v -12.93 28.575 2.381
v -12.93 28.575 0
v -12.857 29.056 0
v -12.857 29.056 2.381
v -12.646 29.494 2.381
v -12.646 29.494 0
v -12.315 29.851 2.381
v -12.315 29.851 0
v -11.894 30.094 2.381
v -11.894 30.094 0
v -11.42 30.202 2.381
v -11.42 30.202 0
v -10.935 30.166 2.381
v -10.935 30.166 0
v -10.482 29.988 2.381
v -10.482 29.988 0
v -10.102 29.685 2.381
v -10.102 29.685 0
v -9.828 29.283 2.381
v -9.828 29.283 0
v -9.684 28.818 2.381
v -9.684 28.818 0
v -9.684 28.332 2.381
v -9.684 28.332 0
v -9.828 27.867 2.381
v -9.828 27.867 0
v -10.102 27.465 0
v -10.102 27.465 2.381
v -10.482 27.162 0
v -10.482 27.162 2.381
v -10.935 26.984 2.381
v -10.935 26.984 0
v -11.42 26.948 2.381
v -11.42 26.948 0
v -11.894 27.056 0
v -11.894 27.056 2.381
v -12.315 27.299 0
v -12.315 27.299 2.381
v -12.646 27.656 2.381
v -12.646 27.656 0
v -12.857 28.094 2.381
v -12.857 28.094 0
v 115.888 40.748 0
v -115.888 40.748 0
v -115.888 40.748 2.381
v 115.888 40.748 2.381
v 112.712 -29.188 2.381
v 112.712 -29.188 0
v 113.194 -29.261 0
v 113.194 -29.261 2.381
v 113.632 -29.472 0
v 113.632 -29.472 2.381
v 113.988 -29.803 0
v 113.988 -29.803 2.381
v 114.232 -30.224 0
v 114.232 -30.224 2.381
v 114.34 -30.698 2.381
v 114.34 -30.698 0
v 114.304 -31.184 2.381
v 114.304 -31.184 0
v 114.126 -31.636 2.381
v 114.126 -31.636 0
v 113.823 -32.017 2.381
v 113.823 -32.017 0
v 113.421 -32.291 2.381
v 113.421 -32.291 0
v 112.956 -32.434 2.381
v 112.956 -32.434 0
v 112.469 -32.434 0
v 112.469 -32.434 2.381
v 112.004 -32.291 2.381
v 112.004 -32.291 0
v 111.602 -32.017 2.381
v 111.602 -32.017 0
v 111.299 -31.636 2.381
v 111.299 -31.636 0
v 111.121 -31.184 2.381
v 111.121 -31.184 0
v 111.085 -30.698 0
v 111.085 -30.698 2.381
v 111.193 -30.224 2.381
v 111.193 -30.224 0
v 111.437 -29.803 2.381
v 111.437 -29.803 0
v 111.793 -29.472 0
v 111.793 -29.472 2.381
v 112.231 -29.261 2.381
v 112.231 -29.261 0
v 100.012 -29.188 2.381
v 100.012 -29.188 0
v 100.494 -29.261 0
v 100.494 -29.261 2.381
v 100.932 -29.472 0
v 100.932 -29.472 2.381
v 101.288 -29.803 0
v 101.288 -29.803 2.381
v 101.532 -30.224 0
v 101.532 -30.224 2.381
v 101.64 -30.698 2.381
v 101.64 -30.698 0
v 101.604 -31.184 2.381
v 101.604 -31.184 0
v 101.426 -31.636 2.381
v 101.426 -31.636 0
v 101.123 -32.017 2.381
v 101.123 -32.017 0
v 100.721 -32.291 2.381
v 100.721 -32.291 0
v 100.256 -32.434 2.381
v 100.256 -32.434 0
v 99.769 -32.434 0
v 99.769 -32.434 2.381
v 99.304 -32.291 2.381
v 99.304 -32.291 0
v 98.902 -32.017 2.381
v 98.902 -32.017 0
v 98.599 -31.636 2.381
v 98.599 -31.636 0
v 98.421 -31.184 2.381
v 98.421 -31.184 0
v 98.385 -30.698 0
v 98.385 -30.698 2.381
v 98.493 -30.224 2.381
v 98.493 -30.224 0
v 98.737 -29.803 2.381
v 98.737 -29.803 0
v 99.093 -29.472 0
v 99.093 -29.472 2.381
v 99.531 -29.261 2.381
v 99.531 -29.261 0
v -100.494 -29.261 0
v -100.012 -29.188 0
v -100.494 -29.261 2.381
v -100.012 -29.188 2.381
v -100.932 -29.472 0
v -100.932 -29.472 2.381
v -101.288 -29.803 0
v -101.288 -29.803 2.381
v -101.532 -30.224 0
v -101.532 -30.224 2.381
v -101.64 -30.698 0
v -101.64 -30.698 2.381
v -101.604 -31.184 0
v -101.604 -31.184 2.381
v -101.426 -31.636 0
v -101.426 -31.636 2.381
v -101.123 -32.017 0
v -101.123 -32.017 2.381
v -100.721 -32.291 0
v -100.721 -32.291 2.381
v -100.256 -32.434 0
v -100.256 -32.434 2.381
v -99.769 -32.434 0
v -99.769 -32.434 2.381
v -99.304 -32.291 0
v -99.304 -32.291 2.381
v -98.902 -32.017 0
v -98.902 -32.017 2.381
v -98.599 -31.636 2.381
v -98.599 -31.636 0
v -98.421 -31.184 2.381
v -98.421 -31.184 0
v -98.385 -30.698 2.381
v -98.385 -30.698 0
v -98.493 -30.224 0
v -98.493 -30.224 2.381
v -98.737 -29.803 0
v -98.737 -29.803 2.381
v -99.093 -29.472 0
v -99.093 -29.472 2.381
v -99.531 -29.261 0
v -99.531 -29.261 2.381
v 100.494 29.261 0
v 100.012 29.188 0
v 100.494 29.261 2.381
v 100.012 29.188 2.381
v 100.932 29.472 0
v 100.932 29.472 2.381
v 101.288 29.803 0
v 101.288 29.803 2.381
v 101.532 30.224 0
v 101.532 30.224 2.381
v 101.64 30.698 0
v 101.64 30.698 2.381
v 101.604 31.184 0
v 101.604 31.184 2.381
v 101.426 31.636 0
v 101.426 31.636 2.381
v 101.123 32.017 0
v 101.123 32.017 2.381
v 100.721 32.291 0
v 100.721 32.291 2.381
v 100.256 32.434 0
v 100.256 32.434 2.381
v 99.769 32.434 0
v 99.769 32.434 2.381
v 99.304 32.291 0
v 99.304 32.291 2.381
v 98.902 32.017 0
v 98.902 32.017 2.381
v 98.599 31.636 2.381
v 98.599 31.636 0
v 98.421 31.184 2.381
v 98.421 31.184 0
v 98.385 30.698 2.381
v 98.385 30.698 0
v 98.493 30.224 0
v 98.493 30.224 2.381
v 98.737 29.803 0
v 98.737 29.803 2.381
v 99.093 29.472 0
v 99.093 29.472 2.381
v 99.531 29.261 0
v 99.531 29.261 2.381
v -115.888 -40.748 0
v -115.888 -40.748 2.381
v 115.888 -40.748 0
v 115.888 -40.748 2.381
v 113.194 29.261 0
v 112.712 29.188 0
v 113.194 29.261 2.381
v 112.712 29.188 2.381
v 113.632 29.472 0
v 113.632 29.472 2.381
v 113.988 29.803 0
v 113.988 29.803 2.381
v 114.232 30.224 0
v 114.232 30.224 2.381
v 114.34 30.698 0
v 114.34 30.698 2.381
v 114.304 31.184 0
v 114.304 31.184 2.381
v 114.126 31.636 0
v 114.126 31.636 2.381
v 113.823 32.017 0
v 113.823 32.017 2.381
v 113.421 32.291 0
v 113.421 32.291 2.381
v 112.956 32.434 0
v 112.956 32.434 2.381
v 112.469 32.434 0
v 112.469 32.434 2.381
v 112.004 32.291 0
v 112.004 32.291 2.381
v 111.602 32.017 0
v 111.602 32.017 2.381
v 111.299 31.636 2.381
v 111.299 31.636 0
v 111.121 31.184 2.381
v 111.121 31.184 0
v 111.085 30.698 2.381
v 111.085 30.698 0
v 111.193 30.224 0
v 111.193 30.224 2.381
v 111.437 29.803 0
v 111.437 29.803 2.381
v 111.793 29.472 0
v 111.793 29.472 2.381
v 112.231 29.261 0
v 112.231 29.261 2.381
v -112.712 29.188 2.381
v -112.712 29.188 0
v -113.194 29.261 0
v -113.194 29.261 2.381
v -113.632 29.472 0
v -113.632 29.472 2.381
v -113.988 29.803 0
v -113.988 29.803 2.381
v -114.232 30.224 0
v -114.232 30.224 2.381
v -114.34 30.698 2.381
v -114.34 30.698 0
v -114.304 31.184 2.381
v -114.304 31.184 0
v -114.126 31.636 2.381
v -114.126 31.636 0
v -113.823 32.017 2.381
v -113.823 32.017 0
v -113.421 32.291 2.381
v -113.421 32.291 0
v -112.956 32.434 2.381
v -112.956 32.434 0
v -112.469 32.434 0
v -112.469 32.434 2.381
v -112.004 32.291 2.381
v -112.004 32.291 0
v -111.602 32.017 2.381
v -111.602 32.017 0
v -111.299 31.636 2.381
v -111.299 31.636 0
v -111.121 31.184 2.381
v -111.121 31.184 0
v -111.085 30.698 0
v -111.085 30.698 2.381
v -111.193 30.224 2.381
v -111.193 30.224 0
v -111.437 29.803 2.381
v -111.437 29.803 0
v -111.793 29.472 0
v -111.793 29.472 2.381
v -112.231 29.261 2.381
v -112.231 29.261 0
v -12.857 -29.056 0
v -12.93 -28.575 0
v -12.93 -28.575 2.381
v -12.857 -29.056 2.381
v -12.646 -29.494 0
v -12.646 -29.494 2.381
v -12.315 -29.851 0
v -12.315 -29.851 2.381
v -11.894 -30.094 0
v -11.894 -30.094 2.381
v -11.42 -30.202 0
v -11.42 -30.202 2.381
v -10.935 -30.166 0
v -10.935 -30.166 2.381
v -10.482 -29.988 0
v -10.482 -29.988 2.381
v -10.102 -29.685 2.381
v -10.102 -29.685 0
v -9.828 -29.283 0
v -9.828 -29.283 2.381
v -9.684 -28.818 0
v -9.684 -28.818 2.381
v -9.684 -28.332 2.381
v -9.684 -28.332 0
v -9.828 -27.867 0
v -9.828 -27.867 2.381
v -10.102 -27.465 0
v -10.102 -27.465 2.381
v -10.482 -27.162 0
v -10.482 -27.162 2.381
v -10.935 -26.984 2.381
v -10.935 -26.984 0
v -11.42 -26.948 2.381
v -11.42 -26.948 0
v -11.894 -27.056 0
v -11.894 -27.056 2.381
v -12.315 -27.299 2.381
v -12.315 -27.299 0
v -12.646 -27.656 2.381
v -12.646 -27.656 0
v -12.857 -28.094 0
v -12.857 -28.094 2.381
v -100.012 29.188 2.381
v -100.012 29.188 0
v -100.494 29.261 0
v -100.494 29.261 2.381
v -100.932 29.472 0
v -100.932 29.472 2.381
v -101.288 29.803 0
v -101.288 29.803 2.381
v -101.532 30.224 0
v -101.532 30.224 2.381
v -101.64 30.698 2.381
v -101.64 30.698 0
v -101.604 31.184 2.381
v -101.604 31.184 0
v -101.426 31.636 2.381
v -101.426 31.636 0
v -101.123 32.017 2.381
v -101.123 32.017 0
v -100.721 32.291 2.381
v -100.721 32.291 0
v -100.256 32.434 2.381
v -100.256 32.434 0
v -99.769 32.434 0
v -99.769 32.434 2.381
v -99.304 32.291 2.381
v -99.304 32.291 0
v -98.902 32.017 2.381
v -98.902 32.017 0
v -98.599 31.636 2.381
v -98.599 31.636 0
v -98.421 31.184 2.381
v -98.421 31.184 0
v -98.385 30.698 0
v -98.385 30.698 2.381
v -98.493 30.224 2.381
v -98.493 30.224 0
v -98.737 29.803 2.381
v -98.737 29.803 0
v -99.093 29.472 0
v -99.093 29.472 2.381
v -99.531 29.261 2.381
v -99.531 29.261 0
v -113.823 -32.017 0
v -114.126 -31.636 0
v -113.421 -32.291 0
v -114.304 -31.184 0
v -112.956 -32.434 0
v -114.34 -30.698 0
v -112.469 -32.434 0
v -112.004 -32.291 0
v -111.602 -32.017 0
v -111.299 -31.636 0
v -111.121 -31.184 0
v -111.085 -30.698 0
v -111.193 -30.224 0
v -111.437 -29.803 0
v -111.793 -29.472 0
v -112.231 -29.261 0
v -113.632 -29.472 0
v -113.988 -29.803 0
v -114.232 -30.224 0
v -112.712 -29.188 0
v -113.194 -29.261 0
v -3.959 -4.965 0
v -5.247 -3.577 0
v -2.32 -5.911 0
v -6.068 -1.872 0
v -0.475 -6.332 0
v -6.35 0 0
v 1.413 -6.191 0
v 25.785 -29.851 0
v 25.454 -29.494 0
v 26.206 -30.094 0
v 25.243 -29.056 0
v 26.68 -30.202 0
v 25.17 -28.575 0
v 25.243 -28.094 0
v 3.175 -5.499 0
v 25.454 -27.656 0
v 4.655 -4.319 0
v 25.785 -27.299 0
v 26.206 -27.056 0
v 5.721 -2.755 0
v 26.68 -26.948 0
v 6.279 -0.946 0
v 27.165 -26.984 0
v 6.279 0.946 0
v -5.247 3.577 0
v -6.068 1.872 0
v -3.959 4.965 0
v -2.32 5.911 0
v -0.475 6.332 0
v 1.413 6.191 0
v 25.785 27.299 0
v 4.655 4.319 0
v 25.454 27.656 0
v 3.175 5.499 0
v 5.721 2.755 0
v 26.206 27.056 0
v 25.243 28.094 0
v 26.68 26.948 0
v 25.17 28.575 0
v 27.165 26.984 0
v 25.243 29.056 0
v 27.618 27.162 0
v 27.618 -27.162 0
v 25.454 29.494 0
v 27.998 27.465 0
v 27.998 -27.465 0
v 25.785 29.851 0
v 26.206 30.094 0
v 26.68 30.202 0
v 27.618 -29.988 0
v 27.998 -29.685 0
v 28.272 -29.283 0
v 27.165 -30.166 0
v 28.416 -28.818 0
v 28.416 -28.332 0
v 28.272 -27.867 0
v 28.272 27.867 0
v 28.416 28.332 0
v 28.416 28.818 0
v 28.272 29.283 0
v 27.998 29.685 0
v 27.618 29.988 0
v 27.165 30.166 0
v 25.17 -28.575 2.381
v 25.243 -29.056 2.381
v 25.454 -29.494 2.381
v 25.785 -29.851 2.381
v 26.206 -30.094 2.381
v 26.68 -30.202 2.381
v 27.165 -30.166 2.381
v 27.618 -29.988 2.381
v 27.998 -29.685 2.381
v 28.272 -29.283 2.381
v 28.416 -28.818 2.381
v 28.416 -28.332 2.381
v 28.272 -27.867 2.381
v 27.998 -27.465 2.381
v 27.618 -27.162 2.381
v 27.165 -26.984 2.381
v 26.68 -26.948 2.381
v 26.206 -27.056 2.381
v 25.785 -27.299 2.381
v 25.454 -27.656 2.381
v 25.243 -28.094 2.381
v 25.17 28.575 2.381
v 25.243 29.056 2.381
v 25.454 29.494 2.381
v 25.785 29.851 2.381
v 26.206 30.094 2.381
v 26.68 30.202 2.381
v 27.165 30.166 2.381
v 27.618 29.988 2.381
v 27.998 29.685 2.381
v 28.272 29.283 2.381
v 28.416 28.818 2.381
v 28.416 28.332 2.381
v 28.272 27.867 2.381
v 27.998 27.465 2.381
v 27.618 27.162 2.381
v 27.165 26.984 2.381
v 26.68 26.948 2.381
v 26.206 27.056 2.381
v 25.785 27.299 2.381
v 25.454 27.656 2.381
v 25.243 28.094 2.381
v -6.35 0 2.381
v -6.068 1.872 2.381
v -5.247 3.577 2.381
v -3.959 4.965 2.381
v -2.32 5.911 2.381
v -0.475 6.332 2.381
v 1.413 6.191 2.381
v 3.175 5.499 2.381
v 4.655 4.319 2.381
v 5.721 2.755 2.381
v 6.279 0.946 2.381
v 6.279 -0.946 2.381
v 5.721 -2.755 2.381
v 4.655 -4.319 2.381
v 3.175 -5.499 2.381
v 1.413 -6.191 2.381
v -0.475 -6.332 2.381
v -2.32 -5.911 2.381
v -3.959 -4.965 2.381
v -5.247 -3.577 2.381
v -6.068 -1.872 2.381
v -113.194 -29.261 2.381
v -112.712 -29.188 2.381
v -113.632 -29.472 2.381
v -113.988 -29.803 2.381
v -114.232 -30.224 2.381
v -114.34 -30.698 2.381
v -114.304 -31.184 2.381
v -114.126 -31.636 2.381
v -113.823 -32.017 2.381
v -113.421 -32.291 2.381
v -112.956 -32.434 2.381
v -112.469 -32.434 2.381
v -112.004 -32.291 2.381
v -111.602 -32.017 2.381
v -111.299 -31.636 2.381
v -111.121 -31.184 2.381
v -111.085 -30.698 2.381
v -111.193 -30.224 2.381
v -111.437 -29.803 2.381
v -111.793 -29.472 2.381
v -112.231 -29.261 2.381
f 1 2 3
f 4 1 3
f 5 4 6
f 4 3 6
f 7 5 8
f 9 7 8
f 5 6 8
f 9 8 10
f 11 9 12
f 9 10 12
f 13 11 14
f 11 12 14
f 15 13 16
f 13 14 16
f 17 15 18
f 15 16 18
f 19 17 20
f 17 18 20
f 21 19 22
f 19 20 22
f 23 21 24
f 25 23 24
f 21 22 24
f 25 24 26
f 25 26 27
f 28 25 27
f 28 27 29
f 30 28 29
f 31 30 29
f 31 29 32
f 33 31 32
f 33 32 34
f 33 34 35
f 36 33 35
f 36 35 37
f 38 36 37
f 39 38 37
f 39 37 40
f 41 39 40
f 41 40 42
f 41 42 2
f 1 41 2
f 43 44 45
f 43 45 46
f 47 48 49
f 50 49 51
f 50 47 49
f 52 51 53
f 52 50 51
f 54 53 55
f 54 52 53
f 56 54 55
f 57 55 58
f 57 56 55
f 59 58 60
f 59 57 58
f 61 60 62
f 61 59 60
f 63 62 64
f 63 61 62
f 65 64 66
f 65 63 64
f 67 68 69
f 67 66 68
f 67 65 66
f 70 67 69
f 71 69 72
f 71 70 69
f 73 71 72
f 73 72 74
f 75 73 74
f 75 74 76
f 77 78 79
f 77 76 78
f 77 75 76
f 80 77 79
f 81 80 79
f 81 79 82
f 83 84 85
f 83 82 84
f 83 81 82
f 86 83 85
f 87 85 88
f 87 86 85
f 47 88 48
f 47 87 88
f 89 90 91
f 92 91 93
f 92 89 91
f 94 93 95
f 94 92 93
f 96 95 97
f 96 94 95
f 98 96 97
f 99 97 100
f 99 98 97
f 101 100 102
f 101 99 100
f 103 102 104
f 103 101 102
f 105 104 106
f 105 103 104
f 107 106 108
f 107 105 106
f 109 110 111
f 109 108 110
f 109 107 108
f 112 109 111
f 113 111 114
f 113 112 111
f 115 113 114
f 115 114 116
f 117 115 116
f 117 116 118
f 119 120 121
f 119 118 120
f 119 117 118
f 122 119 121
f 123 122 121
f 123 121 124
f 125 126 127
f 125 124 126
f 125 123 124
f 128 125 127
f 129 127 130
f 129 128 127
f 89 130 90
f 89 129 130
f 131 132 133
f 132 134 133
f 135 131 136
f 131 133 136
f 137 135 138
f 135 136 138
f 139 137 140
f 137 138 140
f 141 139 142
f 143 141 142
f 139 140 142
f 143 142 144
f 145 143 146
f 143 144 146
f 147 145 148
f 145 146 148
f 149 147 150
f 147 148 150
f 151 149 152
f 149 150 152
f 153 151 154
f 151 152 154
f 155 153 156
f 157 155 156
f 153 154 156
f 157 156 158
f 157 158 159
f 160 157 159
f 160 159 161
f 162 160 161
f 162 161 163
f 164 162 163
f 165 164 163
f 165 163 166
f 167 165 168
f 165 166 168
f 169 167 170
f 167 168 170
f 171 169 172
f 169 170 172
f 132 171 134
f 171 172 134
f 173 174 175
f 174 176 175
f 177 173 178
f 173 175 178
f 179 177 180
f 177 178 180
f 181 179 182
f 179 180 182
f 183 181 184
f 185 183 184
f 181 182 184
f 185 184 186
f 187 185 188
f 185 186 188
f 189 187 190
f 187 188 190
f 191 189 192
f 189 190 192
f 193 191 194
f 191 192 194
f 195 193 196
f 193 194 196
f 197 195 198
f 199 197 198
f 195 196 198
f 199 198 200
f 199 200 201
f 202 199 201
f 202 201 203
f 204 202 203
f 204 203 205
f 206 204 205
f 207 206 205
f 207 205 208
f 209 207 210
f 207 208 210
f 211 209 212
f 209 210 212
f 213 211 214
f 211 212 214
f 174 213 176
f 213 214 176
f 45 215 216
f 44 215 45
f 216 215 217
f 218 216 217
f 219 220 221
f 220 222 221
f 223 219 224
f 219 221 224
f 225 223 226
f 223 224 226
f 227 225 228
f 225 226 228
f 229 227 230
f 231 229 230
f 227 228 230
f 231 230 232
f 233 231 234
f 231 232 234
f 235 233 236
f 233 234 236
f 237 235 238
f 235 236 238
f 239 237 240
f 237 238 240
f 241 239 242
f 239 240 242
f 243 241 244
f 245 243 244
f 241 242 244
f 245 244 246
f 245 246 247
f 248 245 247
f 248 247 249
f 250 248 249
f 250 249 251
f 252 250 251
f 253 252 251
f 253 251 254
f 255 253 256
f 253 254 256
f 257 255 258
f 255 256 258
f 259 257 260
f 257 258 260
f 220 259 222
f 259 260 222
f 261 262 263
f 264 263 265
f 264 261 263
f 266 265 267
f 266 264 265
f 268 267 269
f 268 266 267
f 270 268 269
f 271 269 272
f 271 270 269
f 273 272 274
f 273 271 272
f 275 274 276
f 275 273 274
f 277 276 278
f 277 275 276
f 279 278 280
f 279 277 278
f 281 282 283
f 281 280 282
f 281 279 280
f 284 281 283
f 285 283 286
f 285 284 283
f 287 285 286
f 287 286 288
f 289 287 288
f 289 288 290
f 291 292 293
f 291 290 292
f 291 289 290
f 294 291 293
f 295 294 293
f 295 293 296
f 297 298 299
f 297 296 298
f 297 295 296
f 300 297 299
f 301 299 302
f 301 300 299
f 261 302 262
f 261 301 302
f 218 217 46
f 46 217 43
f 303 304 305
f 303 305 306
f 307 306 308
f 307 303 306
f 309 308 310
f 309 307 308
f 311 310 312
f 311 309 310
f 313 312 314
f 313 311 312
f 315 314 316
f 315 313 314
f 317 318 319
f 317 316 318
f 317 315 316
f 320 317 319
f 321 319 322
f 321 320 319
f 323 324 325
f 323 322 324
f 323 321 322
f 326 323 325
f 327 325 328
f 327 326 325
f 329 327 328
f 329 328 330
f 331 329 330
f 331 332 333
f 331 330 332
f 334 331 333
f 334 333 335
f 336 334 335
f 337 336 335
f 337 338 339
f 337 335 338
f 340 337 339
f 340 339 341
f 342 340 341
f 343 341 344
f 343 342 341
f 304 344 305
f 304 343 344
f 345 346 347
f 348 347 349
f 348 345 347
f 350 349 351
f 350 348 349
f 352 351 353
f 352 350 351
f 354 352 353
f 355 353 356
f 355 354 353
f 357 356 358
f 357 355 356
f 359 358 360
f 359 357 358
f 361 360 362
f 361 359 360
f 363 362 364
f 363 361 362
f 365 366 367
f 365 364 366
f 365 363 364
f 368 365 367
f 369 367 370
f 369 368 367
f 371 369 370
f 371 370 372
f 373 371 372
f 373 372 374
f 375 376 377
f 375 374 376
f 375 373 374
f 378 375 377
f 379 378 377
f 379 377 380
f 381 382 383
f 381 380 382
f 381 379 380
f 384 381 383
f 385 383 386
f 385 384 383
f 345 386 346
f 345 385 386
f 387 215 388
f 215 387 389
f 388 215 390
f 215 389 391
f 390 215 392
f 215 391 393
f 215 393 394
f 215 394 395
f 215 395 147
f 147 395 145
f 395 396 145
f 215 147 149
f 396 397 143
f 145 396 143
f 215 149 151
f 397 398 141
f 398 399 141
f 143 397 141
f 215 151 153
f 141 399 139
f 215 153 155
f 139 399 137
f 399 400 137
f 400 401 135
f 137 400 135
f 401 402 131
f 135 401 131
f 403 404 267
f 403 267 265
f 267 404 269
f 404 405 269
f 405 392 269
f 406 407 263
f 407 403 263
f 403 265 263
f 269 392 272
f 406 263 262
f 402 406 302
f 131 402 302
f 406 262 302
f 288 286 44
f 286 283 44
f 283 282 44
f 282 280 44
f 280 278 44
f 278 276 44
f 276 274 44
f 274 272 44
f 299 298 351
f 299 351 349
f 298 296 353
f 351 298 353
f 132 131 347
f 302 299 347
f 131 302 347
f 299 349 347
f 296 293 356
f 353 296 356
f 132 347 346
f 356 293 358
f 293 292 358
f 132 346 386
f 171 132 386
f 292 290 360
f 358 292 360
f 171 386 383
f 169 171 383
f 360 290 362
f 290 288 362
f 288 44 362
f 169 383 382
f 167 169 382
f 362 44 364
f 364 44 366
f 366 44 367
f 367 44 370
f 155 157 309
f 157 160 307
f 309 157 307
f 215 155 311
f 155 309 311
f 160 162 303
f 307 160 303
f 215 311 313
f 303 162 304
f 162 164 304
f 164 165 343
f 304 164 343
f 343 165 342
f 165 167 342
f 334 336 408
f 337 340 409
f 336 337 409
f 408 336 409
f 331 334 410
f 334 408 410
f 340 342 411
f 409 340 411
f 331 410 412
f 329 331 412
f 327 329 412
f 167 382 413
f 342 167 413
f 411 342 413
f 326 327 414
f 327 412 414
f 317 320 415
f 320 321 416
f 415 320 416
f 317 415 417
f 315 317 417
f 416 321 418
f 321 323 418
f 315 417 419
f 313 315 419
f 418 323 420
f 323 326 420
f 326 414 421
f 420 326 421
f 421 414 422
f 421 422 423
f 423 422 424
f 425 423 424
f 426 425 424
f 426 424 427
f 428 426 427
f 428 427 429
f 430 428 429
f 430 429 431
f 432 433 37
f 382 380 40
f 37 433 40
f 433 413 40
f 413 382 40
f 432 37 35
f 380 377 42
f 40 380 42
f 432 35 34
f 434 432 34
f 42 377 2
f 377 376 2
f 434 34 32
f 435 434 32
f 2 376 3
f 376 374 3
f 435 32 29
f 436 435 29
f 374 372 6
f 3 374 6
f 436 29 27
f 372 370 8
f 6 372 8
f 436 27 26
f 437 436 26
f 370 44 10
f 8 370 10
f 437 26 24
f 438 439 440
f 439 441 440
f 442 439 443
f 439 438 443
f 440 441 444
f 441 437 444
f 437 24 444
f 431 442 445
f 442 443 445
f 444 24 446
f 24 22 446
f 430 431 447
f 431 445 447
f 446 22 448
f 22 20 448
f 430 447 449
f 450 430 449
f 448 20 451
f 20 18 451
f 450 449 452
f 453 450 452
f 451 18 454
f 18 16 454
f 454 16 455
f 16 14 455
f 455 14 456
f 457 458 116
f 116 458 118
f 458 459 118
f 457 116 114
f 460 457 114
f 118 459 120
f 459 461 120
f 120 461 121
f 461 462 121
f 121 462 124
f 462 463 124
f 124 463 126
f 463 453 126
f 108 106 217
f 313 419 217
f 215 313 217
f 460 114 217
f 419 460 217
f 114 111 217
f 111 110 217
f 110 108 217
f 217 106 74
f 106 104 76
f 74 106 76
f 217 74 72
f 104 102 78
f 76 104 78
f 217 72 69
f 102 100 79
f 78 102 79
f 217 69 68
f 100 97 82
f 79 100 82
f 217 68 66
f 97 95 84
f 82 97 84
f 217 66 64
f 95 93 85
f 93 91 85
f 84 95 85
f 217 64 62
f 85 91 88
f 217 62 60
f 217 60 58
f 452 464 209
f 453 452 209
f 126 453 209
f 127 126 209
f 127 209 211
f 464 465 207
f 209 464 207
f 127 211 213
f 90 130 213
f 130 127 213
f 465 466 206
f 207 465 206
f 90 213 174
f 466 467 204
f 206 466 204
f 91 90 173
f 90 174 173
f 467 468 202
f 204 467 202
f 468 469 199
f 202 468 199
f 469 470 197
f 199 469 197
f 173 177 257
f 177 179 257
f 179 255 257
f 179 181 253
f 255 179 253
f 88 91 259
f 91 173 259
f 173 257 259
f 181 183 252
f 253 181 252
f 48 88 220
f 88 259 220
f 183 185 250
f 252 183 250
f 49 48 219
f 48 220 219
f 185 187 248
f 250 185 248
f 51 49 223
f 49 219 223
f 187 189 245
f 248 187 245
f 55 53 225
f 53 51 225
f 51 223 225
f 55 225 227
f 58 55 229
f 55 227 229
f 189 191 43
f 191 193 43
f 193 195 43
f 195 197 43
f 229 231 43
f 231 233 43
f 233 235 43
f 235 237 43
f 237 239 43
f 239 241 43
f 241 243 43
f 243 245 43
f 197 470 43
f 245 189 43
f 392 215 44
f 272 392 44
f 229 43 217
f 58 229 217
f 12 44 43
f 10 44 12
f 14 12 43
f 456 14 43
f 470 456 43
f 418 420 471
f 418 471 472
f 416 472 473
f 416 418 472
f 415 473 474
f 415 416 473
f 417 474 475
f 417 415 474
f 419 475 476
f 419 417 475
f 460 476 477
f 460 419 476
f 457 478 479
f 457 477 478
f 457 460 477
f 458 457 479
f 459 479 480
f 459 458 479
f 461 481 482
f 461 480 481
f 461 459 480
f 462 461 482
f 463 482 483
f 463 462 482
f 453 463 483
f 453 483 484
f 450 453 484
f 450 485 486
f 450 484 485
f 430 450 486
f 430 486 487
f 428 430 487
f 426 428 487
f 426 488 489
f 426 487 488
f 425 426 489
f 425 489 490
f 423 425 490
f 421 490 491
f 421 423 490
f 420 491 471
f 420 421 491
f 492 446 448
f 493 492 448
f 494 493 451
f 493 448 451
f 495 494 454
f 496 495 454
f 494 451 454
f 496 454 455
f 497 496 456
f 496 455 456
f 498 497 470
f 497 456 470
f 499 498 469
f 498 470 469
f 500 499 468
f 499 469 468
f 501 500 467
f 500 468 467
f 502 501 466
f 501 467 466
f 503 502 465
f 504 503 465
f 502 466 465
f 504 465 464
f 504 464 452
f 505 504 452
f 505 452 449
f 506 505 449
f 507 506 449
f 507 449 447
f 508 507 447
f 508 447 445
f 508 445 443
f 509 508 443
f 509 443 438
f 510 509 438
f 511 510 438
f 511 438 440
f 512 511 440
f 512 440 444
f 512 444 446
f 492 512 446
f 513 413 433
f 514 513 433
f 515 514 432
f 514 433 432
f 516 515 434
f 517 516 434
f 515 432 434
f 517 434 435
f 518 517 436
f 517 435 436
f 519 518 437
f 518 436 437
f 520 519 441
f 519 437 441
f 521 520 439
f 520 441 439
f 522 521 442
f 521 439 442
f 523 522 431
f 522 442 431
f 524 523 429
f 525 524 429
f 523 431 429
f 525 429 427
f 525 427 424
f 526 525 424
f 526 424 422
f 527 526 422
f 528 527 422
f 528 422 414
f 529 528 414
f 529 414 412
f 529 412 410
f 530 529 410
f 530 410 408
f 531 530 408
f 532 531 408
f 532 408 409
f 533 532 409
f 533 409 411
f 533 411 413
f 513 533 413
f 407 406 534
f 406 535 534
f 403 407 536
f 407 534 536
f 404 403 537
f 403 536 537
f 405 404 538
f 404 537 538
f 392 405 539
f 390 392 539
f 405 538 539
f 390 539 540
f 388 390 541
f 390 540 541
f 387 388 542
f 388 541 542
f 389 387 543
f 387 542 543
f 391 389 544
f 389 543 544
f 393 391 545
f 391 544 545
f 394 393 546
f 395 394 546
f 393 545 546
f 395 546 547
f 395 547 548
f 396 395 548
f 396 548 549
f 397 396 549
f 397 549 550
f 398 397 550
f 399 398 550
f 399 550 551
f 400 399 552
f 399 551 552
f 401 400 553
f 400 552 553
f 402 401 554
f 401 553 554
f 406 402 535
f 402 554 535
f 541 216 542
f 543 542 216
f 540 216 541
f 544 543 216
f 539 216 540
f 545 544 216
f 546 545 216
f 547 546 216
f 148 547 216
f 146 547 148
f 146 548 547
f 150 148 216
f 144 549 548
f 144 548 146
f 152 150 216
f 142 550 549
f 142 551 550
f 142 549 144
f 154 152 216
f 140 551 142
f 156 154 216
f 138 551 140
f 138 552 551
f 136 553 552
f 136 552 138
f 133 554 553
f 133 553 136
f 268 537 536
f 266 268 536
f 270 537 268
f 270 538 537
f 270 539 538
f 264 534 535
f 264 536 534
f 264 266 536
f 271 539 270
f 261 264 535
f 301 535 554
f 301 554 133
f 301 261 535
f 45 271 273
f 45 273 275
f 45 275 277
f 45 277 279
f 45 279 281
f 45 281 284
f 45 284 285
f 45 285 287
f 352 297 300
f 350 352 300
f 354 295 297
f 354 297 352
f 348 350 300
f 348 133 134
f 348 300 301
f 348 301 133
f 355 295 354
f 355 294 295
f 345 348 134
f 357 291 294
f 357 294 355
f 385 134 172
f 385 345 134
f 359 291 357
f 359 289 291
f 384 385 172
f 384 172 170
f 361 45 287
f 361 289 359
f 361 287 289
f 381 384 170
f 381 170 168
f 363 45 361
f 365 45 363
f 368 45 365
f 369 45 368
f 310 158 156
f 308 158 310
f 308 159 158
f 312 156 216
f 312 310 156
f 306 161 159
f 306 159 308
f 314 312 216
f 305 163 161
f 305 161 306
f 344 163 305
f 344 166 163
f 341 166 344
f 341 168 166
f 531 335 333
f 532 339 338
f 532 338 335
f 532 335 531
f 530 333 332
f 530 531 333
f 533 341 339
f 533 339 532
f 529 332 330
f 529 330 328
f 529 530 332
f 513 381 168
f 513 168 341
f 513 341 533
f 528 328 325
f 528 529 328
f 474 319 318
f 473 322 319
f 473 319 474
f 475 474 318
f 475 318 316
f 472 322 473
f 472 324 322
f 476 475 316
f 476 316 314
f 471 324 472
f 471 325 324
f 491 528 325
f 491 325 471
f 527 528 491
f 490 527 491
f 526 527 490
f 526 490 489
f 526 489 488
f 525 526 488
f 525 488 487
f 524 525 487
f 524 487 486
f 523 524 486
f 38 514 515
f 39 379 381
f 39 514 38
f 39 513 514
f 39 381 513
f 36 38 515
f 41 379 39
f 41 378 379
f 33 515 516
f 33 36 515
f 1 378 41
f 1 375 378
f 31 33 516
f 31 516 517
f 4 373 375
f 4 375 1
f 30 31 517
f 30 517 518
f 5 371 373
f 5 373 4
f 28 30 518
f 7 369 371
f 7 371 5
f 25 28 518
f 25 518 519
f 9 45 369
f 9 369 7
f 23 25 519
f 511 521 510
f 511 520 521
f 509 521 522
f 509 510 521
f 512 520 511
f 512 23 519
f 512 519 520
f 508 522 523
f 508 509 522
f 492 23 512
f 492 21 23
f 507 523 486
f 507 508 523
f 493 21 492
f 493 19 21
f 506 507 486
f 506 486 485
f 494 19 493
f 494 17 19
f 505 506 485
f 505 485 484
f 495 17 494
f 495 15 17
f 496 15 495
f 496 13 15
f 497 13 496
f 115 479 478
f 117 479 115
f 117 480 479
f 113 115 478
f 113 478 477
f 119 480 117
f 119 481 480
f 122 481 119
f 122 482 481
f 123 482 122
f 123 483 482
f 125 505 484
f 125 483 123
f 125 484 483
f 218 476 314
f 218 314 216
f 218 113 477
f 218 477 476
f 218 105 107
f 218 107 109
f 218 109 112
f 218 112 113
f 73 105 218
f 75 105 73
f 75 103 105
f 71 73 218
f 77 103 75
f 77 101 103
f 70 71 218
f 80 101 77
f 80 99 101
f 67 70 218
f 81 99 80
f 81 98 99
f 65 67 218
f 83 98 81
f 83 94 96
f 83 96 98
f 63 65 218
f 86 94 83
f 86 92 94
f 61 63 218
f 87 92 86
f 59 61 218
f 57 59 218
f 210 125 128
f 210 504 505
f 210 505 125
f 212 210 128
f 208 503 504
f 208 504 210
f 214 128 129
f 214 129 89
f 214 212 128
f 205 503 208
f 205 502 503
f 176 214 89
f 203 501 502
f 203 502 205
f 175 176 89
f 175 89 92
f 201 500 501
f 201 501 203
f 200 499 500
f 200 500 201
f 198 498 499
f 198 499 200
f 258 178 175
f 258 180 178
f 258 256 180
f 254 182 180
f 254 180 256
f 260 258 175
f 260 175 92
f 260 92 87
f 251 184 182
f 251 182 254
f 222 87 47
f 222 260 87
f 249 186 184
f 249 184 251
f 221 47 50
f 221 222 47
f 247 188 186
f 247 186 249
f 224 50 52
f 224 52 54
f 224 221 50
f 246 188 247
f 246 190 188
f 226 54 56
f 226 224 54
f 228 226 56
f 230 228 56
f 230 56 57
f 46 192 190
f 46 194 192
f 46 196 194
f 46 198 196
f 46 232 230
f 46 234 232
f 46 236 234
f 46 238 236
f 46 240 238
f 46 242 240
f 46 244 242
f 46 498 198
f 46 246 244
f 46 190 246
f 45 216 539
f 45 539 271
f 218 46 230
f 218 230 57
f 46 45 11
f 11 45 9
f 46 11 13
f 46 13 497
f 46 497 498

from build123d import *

# Parameters (mm, degrees)
SKETCH1_W                      = 231.775
SKETCH1_H                      = 81.4959
BOSS_EXTRUDE1_DEPTH            = 2.38125
F_4_CLEARANCE_HOLE1_D          = 3.2639
F_4_CLEARANCE_HOLE2_AT_2_COUNT = 2
F_4_CLEARANCE_HOLE2_AT_2_PITCH = 12.7
F_1_2_0_5_DIAMETER_HOLE1_D     = 12.7


with BuildPart() as part:
    # Sketch1 → Boss-Extrude1 (new body)
    with BuildSketch(Plane.XY):
        Rectangle(SKETCH1_W, SKETCH1_H)
    extrude(amount=BOSS_EXTRUDE1_DEPTH)

    # #4 Clearance Hole1 (through all)
    with Locations(Plane.XY.offset(2.38125)):
        with Locations((-11.29792, 28.575), (26.80208, 28.575)):
            f_4_clearance_hole1 = Hole(F_4_CLEARANCE_HOLE1_D / 2)

    # Mirror1: #4 Clearance Hole1 across plane
    add(f_4_clearance_hole1.mirror(Plane.ZX), mode=Mode.SUBTRACT)

    # Sketch6 → #4 Clearance Hole2 (revolve, cut)
    with BuildSketch(Plane(origin=(-112.7125, 30.82036, 2.38125), x_dir=(0, -1, 0), z_dir=(1, 0, 0))):
        Polygon((0, 0), (0, 10.505574487), (1.63195, 9.525), (1.63195, 0), align=None)
    f_4_clearance_hole2 = revolve(axis=Axis((-112.7125, 30.82036, 8.73125), (0, 0, -1)), mode=Mode.SUBTRACT)

    # #4 Clearance Hole2 at 2: #4 Clearance Hole2 ×2
    with Locations(*[(i * F_4_CLEARANCE_HOLE2_AT_2_PITCH, 0, 0) for i in range(1, F_4_CLEARANCE_HOLE2_AT_2_COUNT)]):
        add(f_4_clearance_hole2, mode=Mode.SUBTRACT)

    # Mirror2: #4 Clearance Hole2 across plane
    add(f_4_clearance_hole2.mirror(Plane(origin=(0, 0, 0), x_dir=(0, 0, 1), z_dir=(1, 0, 0))), mode=Mode.SUBTRACT)

    # Mirror2 copy 1 sketch → Mirror2 copy 1 (revolve, cut)
    with BuildSketch(Plane(origin=(100.0125, 30.82036, 2.38125), x_dir=(0, -1, 0), z_dir=(-1, 0, 0))):
        Polygon((0, 0), (0, -10.505574487), (1.63195, -9.525), (1.63195, 0), align=None)
    revolve(axis=Axis((100.0125, 30.82036, 8.73125), (0, 0, 1)), mode=Mode.SUBTRACT)

    # Mirror3: #4 Clearance Hole2 across plane
    add(f_4_clearance_hole2.mirror(Plane.ZX), mode=Mode.SUBTRACT)

    # Mirror3 copy 1 sketch → Mirror3 copy 1 (revolve, cut)
    with BuildSketch(Plane(origin=(-100.0125, -30.82036, 2.38125), x_dir=(0, 1, 0), z_dir=(1, 0, 0))):
        Polygon((0, 0), (0, -10.505574487), (1.63195, -9.525), (1.63195, 0), align=None)
    revolve(axis=Axis((-100.0125, -30.82036, 8.73125), (0, 0, 1)), mode=Mode.SUBTRACT)

    # Mirror3 copy 2 sketch → Mirror3 copy 2 (revolve, cut)
    with BuildSketch(Plane(origin=(112.7125, -30.82036, 2.38125), x_dir=(0, 1, 0), z_dir=(-1, 0, 0))):
        Polygon((0, 0), (0, 10.505574487), (1.63195, 9.525), (1.63195, 0), align=None)
    revolve(axis=Axis((112.7125, -30.82036, 8.73125), (0, 0, -1)), mode=Mode.SUBTRACT)

    # Mirror3 copy 3 sketch → Mirror3 copy 3 (revolve, cut)
    with BuildSketch(Plane(origin=(100.0125, -30.82036, 2.38125), x_dir=(0, 1, 0), z_dir=(-1, 0, 0))):
        Polygon((0, 0), (0, 10.505574487), (1.63195, 9.525), (1.63195, 0), align=None)
    revolve(axis=Axis((100.0125, -30.82036, 8.73125), (0, 0, -1)), mode=Mode.SUBTRACT)

    # 1/2 (0.5) Diameter Hole1 (through all)
    with Locations(Plane.XY.offset(2.38125)):
        with Locations((0, 0)):
            Hole(F_1_2_0_5_DIAMETER_HOLE1_D / 2)


solid = part.part
